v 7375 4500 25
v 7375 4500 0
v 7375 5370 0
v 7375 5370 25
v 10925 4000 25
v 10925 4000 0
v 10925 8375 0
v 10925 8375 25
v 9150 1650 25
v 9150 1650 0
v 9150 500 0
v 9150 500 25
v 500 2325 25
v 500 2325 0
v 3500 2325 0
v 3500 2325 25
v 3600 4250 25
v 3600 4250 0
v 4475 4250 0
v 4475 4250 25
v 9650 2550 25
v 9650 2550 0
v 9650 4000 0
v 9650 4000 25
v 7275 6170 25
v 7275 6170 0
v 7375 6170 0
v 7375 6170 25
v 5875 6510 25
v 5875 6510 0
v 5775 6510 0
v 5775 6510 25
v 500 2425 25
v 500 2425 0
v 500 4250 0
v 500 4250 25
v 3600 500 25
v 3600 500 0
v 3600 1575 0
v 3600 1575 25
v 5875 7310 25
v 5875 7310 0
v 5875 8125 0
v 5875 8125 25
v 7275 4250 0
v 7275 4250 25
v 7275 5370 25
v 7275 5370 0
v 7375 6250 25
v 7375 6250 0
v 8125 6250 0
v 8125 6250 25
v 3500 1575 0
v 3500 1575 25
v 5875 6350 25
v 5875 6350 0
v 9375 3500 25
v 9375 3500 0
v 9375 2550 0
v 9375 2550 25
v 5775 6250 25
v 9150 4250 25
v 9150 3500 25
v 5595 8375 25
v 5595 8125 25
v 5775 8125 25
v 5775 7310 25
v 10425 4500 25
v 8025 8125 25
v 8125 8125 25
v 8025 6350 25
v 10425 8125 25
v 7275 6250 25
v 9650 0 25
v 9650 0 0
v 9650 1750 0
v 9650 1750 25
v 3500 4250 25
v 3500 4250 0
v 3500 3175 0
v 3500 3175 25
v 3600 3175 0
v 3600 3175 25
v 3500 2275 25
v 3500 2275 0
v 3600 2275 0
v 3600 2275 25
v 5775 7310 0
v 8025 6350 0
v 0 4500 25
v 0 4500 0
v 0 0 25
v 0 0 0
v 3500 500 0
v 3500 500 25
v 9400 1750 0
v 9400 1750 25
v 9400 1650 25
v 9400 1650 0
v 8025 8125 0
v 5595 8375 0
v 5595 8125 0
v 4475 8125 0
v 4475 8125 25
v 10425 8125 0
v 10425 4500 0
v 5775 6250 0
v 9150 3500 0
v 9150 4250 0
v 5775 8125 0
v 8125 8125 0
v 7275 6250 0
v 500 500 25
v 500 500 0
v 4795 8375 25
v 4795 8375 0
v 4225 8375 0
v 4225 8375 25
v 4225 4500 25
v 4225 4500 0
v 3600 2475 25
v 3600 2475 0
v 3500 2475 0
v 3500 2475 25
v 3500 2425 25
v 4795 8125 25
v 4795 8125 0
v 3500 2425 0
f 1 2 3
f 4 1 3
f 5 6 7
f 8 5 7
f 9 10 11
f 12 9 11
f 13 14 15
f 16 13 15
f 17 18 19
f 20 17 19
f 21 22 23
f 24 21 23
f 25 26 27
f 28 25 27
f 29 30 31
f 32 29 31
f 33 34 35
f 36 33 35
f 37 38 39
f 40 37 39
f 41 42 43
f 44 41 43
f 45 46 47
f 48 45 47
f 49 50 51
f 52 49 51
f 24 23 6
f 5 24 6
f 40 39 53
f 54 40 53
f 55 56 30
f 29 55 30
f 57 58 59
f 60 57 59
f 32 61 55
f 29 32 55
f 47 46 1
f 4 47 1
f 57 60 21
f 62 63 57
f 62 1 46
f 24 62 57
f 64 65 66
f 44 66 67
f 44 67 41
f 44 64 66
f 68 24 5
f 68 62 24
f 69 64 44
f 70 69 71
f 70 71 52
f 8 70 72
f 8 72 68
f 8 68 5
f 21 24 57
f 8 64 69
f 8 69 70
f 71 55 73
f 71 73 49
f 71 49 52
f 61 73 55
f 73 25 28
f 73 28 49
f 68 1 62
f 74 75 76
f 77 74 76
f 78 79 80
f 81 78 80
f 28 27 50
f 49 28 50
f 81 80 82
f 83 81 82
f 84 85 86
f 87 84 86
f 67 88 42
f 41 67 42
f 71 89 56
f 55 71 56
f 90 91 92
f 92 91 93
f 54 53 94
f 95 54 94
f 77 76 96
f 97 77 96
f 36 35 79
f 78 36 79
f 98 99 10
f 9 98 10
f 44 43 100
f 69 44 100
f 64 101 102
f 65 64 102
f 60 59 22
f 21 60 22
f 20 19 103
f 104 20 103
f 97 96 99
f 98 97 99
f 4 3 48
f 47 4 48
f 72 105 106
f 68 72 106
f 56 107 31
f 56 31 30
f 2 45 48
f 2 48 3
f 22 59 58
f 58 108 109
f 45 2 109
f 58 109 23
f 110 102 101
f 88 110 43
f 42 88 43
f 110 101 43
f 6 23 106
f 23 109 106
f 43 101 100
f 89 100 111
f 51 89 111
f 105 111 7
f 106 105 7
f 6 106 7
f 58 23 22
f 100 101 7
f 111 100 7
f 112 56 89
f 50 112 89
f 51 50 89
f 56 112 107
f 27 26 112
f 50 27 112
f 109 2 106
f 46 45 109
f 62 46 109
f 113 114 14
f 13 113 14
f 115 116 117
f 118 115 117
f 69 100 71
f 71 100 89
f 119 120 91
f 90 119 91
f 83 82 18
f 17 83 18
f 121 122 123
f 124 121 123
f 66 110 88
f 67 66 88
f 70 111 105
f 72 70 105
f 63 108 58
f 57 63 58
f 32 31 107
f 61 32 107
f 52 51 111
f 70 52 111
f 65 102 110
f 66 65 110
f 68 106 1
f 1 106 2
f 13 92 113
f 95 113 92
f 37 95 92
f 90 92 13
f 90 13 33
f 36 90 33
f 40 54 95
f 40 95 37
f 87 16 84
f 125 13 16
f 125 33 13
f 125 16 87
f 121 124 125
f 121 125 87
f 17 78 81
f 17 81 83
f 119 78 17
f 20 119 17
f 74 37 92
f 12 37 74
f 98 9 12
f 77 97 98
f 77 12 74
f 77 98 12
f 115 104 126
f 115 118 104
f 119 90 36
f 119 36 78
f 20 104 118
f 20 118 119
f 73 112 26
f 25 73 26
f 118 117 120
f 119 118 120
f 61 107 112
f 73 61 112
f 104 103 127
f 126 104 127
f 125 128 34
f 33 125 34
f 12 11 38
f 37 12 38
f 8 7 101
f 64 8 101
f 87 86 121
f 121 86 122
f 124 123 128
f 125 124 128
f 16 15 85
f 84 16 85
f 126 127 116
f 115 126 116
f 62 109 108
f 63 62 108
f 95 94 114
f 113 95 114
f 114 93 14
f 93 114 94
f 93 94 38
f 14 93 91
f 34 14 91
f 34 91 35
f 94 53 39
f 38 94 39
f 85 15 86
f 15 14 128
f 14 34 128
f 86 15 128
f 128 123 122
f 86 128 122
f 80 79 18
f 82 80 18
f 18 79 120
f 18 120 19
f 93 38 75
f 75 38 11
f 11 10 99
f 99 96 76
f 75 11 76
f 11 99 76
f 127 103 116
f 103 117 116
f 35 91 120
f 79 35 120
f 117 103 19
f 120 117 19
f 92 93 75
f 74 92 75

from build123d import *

# Parameters (mm, degrees)
F1_DEPTH = 25
F2_W     = 2800
F2_H     = 250
F3_DEPTH = 25


with BuildPart() as f1:
    # F0 (on Top) → F1 (new body)
    with BuildSketch(Plane.XY):
        Polygon((0, 4500), (0, 0), (9650, 0), (9650, 1750), (9400, 1750), (9400, 1650), (9150, 1650), (9150, 500), (3600, 500), (3600, 1575), (3500, 1575), (3500, 500), (500, 500), (500, 2325), (3500, 2325), (3500, 2275), (3600, 2275), (3600, 2475), (3500, 2475), (3500, 2425), (500, 2425), (500, 4250), (3500, 4250), (3500, 3175), (3600, 3175), (3600, 4250), (4775, 4250), (4775, 4500), (4475, 4500), (4475, 8125), (4795, 8125), (4795, 8375), (4225, 8375), (4225, 4500), align=None)
        Polygon((5575, 4250), (9150, 4250), (9150, 3500), (9375, 3500), (9375, 2550), (9600, 2550), (9650, 2550), (9650, 4000), (10925, 4000), (10925, 6350), (10425, 6350), (10425, 4500), (7375, 4500), (7375, 5370), (7275, 5370), (7275, 4500), (5575, 4500), align=None)
        Polygon((10425, 6350), (10925, 6350), (10925, 8375), (5595, 8375), (5595, 8125), (5775, 8125), (5775, 7310), (5875, 7310), (5875, 8125), (8025, 8125), (8025, 6350), (5875, 6350), (5875, 6510), (5775, 6510), (5775, 6250), (7275, 6250), (7275, 6170), (7375, 6170), (7375, 6250), (8125, 6250), (8125, 8125), (10425, 8125), align=None)
    extrude(amount=F1_DEPTH)

    # F2 (on face) → F3 (cut)
    with BuildSketch(Plane.XY.offset(25)):
        with Locations((5875, 4375)):
            Rectangle(F2_W, F2_H)
    extrude(amount=-F3_DEPTH, mode=Mode.SUBTRACT)


solid = f1.part
